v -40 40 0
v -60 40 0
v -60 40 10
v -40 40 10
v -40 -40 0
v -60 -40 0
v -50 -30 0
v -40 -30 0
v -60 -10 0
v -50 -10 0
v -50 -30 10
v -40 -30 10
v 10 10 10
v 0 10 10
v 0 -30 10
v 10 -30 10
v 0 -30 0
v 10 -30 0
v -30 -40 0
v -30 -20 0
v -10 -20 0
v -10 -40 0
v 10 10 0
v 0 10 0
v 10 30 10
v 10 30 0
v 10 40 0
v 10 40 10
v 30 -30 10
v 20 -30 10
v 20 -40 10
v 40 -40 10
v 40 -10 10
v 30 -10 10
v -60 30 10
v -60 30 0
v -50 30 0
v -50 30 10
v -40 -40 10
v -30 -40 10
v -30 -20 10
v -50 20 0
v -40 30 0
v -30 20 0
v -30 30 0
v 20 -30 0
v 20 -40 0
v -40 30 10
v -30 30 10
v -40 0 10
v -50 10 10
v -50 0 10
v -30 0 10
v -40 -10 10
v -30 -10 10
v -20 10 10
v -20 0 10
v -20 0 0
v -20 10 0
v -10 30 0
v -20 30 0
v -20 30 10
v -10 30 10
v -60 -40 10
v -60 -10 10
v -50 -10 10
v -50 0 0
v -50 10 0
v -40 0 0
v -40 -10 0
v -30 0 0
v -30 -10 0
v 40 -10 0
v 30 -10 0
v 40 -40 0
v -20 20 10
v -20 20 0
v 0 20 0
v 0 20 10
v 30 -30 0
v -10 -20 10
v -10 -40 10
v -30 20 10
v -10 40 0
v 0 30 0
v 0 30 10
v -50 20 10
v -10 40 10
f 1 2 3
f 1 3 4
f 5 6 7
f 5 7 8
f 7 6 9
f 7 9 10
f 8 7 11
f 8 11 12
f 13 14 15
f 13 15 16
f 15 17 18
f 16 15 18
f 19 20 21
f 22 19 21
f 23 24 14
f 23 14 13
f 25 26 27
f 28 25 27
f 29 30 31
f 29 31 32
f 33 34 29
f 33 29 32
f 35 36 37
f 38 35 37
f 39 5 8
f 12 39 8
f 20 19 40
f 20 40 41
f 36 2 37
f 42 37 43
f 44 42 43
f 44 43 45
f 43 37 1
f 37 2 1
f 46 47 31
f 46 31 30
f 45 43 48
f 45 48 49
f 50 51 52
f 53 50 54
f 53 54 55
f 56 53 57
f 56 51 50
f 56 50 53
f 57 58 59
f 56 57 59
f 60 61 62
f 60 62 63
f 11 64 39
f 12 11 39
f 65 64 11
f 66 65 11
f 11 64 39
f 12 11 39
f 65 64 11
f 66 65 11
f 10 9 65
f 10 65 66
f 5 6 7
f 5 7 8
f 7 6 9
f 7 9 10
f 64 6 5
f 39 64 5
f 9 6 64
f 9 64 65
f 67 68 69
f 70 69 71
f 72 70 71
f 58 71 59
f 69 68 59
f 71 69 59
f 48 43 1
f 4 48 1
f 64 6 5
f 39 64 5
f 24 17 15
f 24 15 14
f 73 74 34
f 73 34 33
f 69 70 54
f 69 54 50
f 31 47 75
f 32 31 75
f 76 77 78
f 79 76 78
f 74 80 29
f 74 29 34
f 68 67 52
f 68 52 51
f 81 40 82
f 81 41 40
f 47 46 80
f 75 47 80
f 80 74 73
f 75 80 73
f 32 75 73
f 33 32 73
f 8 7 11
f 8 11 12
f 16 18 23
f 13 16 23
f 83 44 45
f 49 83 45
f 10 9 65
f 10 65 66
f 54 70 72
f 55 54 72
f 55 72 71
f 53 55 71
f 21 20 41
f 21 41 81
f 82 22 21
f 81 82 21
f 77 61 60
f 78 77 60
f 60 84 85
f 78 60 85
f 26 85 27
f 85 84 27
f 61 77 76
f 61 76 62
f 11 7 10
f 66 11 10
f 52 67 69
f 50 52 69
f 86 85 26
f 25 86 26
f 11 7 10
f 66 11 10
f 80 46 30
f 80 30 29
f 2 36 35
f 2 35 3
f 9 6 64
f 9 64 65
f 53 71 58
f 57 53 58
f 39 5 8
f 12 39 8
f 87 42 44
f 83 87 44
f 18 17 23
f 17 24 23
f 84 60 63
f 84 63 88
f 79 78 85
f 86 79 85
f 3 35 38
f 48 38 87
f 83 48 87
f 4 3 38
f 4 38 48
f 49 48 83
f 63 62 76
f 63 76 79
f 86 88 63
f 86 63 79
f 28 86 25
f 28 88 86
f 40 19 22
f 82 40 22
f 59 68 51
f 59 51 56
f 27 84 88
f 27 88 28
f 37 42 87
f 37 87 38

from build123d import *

# Parameters (mm, degrees)
BOX001_W     = 10
BOX001_H     = 10
BOX001_DEPTH = 10
BOX002_W     = 10
BOX002_H     = 10
BOX002_DEPTH = 10
BOX003_W     = 10
BOX003_H     = 10
BOX003_DEPTH = 10
BOX_W        = 10
BOX_H        = 10
BOX_DEPTH    = 10
BOX005_W     = 10
BOX005_H     = 10
BOX005_DEPTH = 10
BOX006_W     = 10
BOX006_H     = 10
BOX006_DEPTH = 10
BOX007_W     = 10
BOX007_H     = 10
BOX007_DEPTH = 10
BOX004_W     = 10
BOX004_H     = 10
BOX004_DEPTH = 10
BOX009_W     = 10
BOX009_H     = 10
BOX009_DEPTH = 10
BOX010_W     = 10
BOX010_H     = 10
BOX010_DEPTH = 10
BOX011_W     = 10
BOX011_H     = 10
BOX011_DEPTH = 10
BOX008_W     = 10
BOX008_H     = 10
BOX008_DEPTH = 10
BOX013_W     = 10
BOX013_H     = 10
BOX013_DEPTH = 10
BOX014_W     = 10
BOX014_H     = 10
BOX014_DEPTH = 10
BOX015_W     = 10
BOX015_H     = 10
BOX015_DEPTH = 10
BOX012_W     = 10
BOX012_H     = 10
BOX012_DEPTH = 10
BOX017_W     = 10
BOX017_H     = 10
BOX017_DEPTH = 10
BOX018_W     = 10
BOX018_H     = 10
BOX018_DEPTH = 10
BOX019_W     = 10
BOX019_H     = 10
BOX019_DEPTH = 10
BOX016_W     = 10
BOX016_H     = 10
BOX016_DEPTH = 10
BOX021_W     = 10
BOX021_H     = 10
BOX021_DEPTH = 10
BOX022_W     = 10
BOX022_H     = 10
BOX022_DEPTH = 10
BOX023_W     = 10
BOX023_H     = 10
BOX023_DEPTH = 10
BOX020_W     = 10
BOX020_H     = 10
BOX020_DEPTH = 10
BOX025_W     = 10
BOX025_H     = 10
BOX025_DEPTH = 10
BOX026_W     = 10
BOX026_H     = 10
BOX026_DEPTH = 10
BOX027_W     = 10
BOX027_H     = 10
BOX027_DEPTH = 10
BOX024_W     = 10
BOX024_H     = 10
BOX024_DEPTH = 10
BOX029_W     = 10
BOX029_H     = 10
BOX029_DEPTH = 10
BOX030_W     = 10
BOX030_H     = 10
BOX030_DEPTH = 10
BOX031_W     = 10
BOX031_H     = 10
BOX031_DEPTH = 10
BOX028_W     = 10
BOX028_H     = 10
BOX028_DEPTH = 10


with BuildPart() as cube001:
    # Box001 → Box001 (new body)
    with BuildSketch(Plane(origin=(0, -10, 0), x_dir=(1, 0, 0), z_dir=(0, 0, 1))):
        with Locations((5, 5)):
            Rectangle(BOX001_W, BOX001_H)
    extrude(amount=BOX001_DEPTH)


with BuildPart() as cube002:
    # Box002 → Box002 (new body)
    with BuildSketch(Plane(origin=(0, -20, 0), x_dir=(1, 0, 0), z_dir=(0, 0, 1))):
        with Locations((5, 5)):
            Rectangle(BOX002_W, BOX002_H)
    extrude(amount=BOX002_DEPTH)


with BuildPart() as cube003:
    # Box003 → Box003 (new body)
    with BuildSketch(Plane(origin=(0, -30, 0), x_dir=(1, 0, 0), z_dir=(0, 0, 1))):
        with Locations((5, 5)):
            Rectangle(BOX003_W, BOX003_H)
    extrude(amount=BOX003_DEPTH)


with BuildPart() as fusion:
    # Box → Box (new body)
    with BuildSketch(Plane.XY):
        with Locations((5, 5)):
            Rectangle(BOX_W, BOX_H)
    extrude(amount=BOX_DEPTH)

    # Fusion: union Cube001, Cube002, Cube003
    add(cube001.part)
    add(cube002.part)
    add(cube003.part)


with BuildPart() as cube005:
    # Box005 → Box005 (new body)
    with BuildSketch(Plane(origin=(-40, 0, 0), x_dir=(1, 0, 0), z_dir=(0, 0, 1))):
        with Locations((5, 5)):
            Rectangle(BOX005_W, BOX005_H)
    extrude(amount=BOX005_DEPTH)


with BuildPart() as cube006:
    # Box006 → Box006 (new body)
    with BuildSketch(Plane(origin=(-50, 0, 0), x_dir=(1, 0, 0), z_dir=(0, 0, 1))):
        with Locations((5, 5)):
            Rectangle(BOX006_W, BOX006_H)
    extrude(amount=BOX006_DEPTH)


with BuildPart() as cube007:
    # Box007 → Box007 (new body)
    with BuildSketch(Plane(origin=(-40, -10, 0), x_dir=(1, 0, 0), z_dir=(0, 0, 1))):
        with Locations((5, 5)):
            Rectangle(BOX007_W, BOX007_H)
    extrude(amount=BOX007_DEPTH)


with BuildPart() as fusion001:
    # Box004 → Box004 (new body)
    with BuildSketch(Plane(origin=(-30, 0, 0), x_dir=(1, 0, 0), z_dir=(0, 0, 1))):
        with Locations((5, 5)):
            Rectangle(BOX004_W, BOX004_H)
    extrude(amount=BOX004_DEPTH)

    # Fusion001: union Cube005, Cube006, Cube007
    add(cube005.part)
    add(cube006.part)
    add(cube007.part)


with BuildPart() as cube009:
    # Box009 → Box009 (new body)
    with BuildSketch(Plane(origin=(-30, -30, 0), x_dir=(1, 0, 0), z_dir=(0, 0, 1))):
        with Locations((5, 5)):
            Rectangle(BOX009_W, BOX009_H)
    extrude(amount=BOX009_DEPTH)


with BuildPart() as cube010:
    # Box010 → Box010 (new body)
    with BuildSketch(Plane(origin=(-30, -40, 0), x_dir=(1, 0, 0), z_dir=(0, 0, 1))):
        with Locations((5, 5)):
            Rectangle(BOX010_W, BOX010_H)
    extrude(amount=BOX010_DEPTH)


with BuildPart() as cube011:
    # Box011 → Box011 (new body)
    with BuildSketch(Plane(origin=(-20, -40, 0), x_dir=(1, 0, 0), z_dir=(0, 0, 1))):
        with Locations((5, 5)):
            Rectangle(BOX011_W, BOX011_H)
    extrude(amount=BOX011_DEPTH)


with BuildPart() as fusion002:
    # Box008 → Box008 (new body)
    with BuildSketch(Plane(origin=(-20, -30, 0), x_dir=(1, 0, 0), z_dir=(0, 0, 1))):
        with Locations((5, 5)):
            Rectangle(BOX008_W, BOX008_H)
    extrude(amount=BOX008_DEPTH)

    # Fusion002: union Cube009, Cube010, Cube011
    add(cube009.part)
    add(cube010.part)
    add(cube011.part)


with BuildPart() as cube013:
    # Box013 → Box013 (new body)
    with BuildSketch(Plane(origin=(-60, -30, 0), x_dir=(1, 0, 0), z_dir=(0, 0, 1))):
        with Locations((5, 5)):
            Rectangle(BOX013_W, BOX013_H)
    extrude(amount=BOX013_DEPTH)


with BuildPart() as cube014:
    # Box014 → Box014 (new body)
    with BuildSketch(Plane(origin=(-60, -20, 0), x_dir=(1, 0, 0), z_dir=(0, 0, 1))):
        with Locations((5, 5)):
            Rectangle(BOX014_W, BOX014_H)
    extrude(amount=BOX014_DEPTH)


with BuildPart() as cube015:
    # Box015 → Box015 (new body)
    with BuildSketch(Plane(origin=(-50, -40, 0), x_dir=(1, 0, 0), z_dir=(0, 0, 1))):
        with Locations((5, 5)):
            Rectangle(BOX015_W, BOX015_H)
    extrude(amount=BOX015_DEPTH)


with BuildPart() as fusion003:
    # Box012 → Box012 (new body)
    with BuildSketch(Plane(origin=(-60, -40, 0), x_dir=(1, 0, 0), z_dir=(0, 0, 1))):
        with Locations((5, 5)):
            Rectangle(BOX012_W, BOX012_H)
    extrude(amount=BOX012_DEPTH)

    # Fusion003: union Cube013, Cube014, Cube015
    add(cube013.part)
    add(cube014.part)
    add(cube015.part)


with BuildPart() as cube017:
    # Box017 → Box017 (new body)
    with BuildSketch(Plane(origin=(-60, -30, 0), x_dir=(1, 0, 0), z_dir=(0, 0, 1))):
        with Locations((5, 5)):
            Rectangle(BOX017_W, BOX017_H)
    extrude(amount=BOX017_DEPTH)


with BuildPart() as cube018:
    # Box018 → Box018 (new body)
    with BuildSketch(Plane(origin=(-60, -20, 0), x_dir=(1, 0, 0), z_dir=(0, 0, 1))):
        with Locations((5, 5)):
            Rectangle(BOX018_W, BOX018_H)
    extrude(amount=BOX018_DEPTH)


with BuildPart() as cube019:
    # Box019 → Box019 (new body)
    with BuildSketch(Plane(origin=(-50, -40, 0), x_dir=(1, 0, 0), z_dir=(0, 0, 1))):
        with Locations((5, 5)):
            Rectangle(BOX019_W, BOX019_H)
    extrude(amount=BOX019_DEPTH)


with BuildPart() as fusion004:
    # Box016 → Box016 (new body)
    with BuildSketch(Plane(origin=(-60, -40, 0), x_dir=(1, 0, 0), z_dir=(0, 0, 1))):
        with Locations((5, 5)):
            Rectangle(BOX016_W, BOX016_H)
    extrude(amount=BOX016_DEPTH)

    # Fusion004: union Cube017, Cube018, Cube019
    add(cube017.part)
    add(cube018.part)
    add(cube019.part)


with BuildPart() as cube021:
    # Box021 → Box021 (new body)
    with BuildSketch(Plane(origin=(30, -30, 0), x_dir=(1, 0, 0), z_dir=(0, 0, 1))):
        with Locations((5, 5)):
            Rectangle(BOX021_W, BOX021_H)
    extrude(amount=BOX021_DEPTH)


with BuildPart() as cube022:
    # Box022 → Box022 (new body)
    with BuildSketch(Plane(origin=(30, -20, 0), x_dir=(1, 0, 0), z_dir=(0, 0, 1))):
        with Locations((5, 5)):
            Rectangle(BOX022_W, BOX022_H)
    extrude(amount=BOX022_DEPTH)


with BuildPart() as cube023:
    # Box023 → Box023 (new body)
    with BuildSketch(Plane(origin=(20, -40, 0), x_dir=(1, 0, 0), z_dir=(0, 0, 1))):
        with Locations((5, 5)):
            Rectangle(BOX023_W, BOX023_H)
    extrude(amount=BOX023_DEPTH)


with BuildPart() as fusion005:
    # Box020 → Box020 (new body)
    with BuildSketch(Plane(origin=(30, -40, 0), x_dir=(1, 0, 0), z_dir=(0, 0, 1))):
        with Locations((5, 5)):
            Rectangle(BOX020_W, BOX020_H)
    extrude(amount=BOX020_DEPTH)

    # Fusion005: union Cube021, Cube022, Cube023
    add(cube021.part)
    add(cube022.part)
    add(cube023.part)


with BuildPart() as cube025:
    # Box025 → Box025 (new body)
    with BuildSketch(Plane(origin=(-10, 20, 0), x_dir=(1, 0, 0), z_dir=(0, 0, 1))):
        with Locations((5, 5)):
            Rectangle(BOX025_W, BOX025_H)
    extrude(amount=BOX025_DEPTH)


with BuildPart() as cube026:
    # Box026 → Box026 (new body)
    with BuildSketch(Plane(origin=(-10, 30, 0), x_dir=(1, 0, 0), z_dir=(0, 0, 1))):
        with Locations((5, 5)):
            Rectangle(BOX026_W, BOX026_H)
    extrude(amount=BOX026_DEPTH)


with BuildPart() as cube027:
    # Box027 → Box027 (new body)
    with BuildSketch(Plane(origin=(0, 30, 0), x_dir=(1, 0, 0), z_dir=(0, 0, 1))):
        with Locations((5, 5)):
            Rectangle(BOX027_W, BOX027_H)
    extrude(amount=BOX027_DEPTH)


with BuildPart() as fusion006:
    # Box024 → Box024 (new body)
    with BuildSketch(Plane(origin=(-20, 20, 0), x_dir=(1, 0, 0), z_dir=(0, 0, 1))):
        with Locations((5, 5)):
            Rectangle(BOX024_W, BOX024_H)
    extrude(amount=BOX024_DEPTH)

    # Fusion006: union Cube025, Cube026, Cube027
    add(cube025.part)
    add(cube026.part)
    add(cube027.part)


with BuildPart() as cube029:
    # Box029 → Box029 (new body)
    with BuildSketch(Plane(origin=(-50, 30, 0), x_dir=(1, 0, 0), z_dir=(0, 0, 1))):
        with Locations((5, 5)):
            Rectangle(BOX029_W, BOX029_H)
    extrude(amount=BOX029_DEPTH)


with BuildPart() as cube030:
    # Box030 → Box030 (new body)
    with BuildSketch(Plane(origin=(-50, 20, 0), x_dir=(1, 0, 0), z_dir=(0, 0, 1))):
        with Locations((5, 5)):
            Rectangle(BOX030_W, BOX030_H)
    extrude(amount=BOX030_DEPTH)


with BuildPart() as cube031:
    # Box031 → Box031 (new body)
    with BuildSketch(Plane(origin=(-40, 20, 0), x_dir=(1, 0, 0), z_dir=(0, 0, 1))):
        with Locations((5, 5)):
            Rectangle(BOX031_W, BOX031_H)
    extrude(amount=BOX031_DEPTH)


with BuildPart() as fusion007:
    # Box028 → Box028 (new body)
    with BuildSketch(Plane(origin=(-60, 30, 0), x_dir=(1, 0, 0), z_dir=(0, 0, 1))):
        with Locations((5, 5)):
            Rectangle(BOX028_W, BOX028_H)
    extrude(amount=BOX028_DEPTH)

    # Fusion007: union Cube029, Cube030, Cube031
    add(cube029.part)
    add(cube030.part)
    add(cube031.part)


solid = Compound([fusion.part, fusion001.part, fusion002.part, fusion003.part, fusion004.part, fusion005.part, fusion006.part, fusion007.part])
